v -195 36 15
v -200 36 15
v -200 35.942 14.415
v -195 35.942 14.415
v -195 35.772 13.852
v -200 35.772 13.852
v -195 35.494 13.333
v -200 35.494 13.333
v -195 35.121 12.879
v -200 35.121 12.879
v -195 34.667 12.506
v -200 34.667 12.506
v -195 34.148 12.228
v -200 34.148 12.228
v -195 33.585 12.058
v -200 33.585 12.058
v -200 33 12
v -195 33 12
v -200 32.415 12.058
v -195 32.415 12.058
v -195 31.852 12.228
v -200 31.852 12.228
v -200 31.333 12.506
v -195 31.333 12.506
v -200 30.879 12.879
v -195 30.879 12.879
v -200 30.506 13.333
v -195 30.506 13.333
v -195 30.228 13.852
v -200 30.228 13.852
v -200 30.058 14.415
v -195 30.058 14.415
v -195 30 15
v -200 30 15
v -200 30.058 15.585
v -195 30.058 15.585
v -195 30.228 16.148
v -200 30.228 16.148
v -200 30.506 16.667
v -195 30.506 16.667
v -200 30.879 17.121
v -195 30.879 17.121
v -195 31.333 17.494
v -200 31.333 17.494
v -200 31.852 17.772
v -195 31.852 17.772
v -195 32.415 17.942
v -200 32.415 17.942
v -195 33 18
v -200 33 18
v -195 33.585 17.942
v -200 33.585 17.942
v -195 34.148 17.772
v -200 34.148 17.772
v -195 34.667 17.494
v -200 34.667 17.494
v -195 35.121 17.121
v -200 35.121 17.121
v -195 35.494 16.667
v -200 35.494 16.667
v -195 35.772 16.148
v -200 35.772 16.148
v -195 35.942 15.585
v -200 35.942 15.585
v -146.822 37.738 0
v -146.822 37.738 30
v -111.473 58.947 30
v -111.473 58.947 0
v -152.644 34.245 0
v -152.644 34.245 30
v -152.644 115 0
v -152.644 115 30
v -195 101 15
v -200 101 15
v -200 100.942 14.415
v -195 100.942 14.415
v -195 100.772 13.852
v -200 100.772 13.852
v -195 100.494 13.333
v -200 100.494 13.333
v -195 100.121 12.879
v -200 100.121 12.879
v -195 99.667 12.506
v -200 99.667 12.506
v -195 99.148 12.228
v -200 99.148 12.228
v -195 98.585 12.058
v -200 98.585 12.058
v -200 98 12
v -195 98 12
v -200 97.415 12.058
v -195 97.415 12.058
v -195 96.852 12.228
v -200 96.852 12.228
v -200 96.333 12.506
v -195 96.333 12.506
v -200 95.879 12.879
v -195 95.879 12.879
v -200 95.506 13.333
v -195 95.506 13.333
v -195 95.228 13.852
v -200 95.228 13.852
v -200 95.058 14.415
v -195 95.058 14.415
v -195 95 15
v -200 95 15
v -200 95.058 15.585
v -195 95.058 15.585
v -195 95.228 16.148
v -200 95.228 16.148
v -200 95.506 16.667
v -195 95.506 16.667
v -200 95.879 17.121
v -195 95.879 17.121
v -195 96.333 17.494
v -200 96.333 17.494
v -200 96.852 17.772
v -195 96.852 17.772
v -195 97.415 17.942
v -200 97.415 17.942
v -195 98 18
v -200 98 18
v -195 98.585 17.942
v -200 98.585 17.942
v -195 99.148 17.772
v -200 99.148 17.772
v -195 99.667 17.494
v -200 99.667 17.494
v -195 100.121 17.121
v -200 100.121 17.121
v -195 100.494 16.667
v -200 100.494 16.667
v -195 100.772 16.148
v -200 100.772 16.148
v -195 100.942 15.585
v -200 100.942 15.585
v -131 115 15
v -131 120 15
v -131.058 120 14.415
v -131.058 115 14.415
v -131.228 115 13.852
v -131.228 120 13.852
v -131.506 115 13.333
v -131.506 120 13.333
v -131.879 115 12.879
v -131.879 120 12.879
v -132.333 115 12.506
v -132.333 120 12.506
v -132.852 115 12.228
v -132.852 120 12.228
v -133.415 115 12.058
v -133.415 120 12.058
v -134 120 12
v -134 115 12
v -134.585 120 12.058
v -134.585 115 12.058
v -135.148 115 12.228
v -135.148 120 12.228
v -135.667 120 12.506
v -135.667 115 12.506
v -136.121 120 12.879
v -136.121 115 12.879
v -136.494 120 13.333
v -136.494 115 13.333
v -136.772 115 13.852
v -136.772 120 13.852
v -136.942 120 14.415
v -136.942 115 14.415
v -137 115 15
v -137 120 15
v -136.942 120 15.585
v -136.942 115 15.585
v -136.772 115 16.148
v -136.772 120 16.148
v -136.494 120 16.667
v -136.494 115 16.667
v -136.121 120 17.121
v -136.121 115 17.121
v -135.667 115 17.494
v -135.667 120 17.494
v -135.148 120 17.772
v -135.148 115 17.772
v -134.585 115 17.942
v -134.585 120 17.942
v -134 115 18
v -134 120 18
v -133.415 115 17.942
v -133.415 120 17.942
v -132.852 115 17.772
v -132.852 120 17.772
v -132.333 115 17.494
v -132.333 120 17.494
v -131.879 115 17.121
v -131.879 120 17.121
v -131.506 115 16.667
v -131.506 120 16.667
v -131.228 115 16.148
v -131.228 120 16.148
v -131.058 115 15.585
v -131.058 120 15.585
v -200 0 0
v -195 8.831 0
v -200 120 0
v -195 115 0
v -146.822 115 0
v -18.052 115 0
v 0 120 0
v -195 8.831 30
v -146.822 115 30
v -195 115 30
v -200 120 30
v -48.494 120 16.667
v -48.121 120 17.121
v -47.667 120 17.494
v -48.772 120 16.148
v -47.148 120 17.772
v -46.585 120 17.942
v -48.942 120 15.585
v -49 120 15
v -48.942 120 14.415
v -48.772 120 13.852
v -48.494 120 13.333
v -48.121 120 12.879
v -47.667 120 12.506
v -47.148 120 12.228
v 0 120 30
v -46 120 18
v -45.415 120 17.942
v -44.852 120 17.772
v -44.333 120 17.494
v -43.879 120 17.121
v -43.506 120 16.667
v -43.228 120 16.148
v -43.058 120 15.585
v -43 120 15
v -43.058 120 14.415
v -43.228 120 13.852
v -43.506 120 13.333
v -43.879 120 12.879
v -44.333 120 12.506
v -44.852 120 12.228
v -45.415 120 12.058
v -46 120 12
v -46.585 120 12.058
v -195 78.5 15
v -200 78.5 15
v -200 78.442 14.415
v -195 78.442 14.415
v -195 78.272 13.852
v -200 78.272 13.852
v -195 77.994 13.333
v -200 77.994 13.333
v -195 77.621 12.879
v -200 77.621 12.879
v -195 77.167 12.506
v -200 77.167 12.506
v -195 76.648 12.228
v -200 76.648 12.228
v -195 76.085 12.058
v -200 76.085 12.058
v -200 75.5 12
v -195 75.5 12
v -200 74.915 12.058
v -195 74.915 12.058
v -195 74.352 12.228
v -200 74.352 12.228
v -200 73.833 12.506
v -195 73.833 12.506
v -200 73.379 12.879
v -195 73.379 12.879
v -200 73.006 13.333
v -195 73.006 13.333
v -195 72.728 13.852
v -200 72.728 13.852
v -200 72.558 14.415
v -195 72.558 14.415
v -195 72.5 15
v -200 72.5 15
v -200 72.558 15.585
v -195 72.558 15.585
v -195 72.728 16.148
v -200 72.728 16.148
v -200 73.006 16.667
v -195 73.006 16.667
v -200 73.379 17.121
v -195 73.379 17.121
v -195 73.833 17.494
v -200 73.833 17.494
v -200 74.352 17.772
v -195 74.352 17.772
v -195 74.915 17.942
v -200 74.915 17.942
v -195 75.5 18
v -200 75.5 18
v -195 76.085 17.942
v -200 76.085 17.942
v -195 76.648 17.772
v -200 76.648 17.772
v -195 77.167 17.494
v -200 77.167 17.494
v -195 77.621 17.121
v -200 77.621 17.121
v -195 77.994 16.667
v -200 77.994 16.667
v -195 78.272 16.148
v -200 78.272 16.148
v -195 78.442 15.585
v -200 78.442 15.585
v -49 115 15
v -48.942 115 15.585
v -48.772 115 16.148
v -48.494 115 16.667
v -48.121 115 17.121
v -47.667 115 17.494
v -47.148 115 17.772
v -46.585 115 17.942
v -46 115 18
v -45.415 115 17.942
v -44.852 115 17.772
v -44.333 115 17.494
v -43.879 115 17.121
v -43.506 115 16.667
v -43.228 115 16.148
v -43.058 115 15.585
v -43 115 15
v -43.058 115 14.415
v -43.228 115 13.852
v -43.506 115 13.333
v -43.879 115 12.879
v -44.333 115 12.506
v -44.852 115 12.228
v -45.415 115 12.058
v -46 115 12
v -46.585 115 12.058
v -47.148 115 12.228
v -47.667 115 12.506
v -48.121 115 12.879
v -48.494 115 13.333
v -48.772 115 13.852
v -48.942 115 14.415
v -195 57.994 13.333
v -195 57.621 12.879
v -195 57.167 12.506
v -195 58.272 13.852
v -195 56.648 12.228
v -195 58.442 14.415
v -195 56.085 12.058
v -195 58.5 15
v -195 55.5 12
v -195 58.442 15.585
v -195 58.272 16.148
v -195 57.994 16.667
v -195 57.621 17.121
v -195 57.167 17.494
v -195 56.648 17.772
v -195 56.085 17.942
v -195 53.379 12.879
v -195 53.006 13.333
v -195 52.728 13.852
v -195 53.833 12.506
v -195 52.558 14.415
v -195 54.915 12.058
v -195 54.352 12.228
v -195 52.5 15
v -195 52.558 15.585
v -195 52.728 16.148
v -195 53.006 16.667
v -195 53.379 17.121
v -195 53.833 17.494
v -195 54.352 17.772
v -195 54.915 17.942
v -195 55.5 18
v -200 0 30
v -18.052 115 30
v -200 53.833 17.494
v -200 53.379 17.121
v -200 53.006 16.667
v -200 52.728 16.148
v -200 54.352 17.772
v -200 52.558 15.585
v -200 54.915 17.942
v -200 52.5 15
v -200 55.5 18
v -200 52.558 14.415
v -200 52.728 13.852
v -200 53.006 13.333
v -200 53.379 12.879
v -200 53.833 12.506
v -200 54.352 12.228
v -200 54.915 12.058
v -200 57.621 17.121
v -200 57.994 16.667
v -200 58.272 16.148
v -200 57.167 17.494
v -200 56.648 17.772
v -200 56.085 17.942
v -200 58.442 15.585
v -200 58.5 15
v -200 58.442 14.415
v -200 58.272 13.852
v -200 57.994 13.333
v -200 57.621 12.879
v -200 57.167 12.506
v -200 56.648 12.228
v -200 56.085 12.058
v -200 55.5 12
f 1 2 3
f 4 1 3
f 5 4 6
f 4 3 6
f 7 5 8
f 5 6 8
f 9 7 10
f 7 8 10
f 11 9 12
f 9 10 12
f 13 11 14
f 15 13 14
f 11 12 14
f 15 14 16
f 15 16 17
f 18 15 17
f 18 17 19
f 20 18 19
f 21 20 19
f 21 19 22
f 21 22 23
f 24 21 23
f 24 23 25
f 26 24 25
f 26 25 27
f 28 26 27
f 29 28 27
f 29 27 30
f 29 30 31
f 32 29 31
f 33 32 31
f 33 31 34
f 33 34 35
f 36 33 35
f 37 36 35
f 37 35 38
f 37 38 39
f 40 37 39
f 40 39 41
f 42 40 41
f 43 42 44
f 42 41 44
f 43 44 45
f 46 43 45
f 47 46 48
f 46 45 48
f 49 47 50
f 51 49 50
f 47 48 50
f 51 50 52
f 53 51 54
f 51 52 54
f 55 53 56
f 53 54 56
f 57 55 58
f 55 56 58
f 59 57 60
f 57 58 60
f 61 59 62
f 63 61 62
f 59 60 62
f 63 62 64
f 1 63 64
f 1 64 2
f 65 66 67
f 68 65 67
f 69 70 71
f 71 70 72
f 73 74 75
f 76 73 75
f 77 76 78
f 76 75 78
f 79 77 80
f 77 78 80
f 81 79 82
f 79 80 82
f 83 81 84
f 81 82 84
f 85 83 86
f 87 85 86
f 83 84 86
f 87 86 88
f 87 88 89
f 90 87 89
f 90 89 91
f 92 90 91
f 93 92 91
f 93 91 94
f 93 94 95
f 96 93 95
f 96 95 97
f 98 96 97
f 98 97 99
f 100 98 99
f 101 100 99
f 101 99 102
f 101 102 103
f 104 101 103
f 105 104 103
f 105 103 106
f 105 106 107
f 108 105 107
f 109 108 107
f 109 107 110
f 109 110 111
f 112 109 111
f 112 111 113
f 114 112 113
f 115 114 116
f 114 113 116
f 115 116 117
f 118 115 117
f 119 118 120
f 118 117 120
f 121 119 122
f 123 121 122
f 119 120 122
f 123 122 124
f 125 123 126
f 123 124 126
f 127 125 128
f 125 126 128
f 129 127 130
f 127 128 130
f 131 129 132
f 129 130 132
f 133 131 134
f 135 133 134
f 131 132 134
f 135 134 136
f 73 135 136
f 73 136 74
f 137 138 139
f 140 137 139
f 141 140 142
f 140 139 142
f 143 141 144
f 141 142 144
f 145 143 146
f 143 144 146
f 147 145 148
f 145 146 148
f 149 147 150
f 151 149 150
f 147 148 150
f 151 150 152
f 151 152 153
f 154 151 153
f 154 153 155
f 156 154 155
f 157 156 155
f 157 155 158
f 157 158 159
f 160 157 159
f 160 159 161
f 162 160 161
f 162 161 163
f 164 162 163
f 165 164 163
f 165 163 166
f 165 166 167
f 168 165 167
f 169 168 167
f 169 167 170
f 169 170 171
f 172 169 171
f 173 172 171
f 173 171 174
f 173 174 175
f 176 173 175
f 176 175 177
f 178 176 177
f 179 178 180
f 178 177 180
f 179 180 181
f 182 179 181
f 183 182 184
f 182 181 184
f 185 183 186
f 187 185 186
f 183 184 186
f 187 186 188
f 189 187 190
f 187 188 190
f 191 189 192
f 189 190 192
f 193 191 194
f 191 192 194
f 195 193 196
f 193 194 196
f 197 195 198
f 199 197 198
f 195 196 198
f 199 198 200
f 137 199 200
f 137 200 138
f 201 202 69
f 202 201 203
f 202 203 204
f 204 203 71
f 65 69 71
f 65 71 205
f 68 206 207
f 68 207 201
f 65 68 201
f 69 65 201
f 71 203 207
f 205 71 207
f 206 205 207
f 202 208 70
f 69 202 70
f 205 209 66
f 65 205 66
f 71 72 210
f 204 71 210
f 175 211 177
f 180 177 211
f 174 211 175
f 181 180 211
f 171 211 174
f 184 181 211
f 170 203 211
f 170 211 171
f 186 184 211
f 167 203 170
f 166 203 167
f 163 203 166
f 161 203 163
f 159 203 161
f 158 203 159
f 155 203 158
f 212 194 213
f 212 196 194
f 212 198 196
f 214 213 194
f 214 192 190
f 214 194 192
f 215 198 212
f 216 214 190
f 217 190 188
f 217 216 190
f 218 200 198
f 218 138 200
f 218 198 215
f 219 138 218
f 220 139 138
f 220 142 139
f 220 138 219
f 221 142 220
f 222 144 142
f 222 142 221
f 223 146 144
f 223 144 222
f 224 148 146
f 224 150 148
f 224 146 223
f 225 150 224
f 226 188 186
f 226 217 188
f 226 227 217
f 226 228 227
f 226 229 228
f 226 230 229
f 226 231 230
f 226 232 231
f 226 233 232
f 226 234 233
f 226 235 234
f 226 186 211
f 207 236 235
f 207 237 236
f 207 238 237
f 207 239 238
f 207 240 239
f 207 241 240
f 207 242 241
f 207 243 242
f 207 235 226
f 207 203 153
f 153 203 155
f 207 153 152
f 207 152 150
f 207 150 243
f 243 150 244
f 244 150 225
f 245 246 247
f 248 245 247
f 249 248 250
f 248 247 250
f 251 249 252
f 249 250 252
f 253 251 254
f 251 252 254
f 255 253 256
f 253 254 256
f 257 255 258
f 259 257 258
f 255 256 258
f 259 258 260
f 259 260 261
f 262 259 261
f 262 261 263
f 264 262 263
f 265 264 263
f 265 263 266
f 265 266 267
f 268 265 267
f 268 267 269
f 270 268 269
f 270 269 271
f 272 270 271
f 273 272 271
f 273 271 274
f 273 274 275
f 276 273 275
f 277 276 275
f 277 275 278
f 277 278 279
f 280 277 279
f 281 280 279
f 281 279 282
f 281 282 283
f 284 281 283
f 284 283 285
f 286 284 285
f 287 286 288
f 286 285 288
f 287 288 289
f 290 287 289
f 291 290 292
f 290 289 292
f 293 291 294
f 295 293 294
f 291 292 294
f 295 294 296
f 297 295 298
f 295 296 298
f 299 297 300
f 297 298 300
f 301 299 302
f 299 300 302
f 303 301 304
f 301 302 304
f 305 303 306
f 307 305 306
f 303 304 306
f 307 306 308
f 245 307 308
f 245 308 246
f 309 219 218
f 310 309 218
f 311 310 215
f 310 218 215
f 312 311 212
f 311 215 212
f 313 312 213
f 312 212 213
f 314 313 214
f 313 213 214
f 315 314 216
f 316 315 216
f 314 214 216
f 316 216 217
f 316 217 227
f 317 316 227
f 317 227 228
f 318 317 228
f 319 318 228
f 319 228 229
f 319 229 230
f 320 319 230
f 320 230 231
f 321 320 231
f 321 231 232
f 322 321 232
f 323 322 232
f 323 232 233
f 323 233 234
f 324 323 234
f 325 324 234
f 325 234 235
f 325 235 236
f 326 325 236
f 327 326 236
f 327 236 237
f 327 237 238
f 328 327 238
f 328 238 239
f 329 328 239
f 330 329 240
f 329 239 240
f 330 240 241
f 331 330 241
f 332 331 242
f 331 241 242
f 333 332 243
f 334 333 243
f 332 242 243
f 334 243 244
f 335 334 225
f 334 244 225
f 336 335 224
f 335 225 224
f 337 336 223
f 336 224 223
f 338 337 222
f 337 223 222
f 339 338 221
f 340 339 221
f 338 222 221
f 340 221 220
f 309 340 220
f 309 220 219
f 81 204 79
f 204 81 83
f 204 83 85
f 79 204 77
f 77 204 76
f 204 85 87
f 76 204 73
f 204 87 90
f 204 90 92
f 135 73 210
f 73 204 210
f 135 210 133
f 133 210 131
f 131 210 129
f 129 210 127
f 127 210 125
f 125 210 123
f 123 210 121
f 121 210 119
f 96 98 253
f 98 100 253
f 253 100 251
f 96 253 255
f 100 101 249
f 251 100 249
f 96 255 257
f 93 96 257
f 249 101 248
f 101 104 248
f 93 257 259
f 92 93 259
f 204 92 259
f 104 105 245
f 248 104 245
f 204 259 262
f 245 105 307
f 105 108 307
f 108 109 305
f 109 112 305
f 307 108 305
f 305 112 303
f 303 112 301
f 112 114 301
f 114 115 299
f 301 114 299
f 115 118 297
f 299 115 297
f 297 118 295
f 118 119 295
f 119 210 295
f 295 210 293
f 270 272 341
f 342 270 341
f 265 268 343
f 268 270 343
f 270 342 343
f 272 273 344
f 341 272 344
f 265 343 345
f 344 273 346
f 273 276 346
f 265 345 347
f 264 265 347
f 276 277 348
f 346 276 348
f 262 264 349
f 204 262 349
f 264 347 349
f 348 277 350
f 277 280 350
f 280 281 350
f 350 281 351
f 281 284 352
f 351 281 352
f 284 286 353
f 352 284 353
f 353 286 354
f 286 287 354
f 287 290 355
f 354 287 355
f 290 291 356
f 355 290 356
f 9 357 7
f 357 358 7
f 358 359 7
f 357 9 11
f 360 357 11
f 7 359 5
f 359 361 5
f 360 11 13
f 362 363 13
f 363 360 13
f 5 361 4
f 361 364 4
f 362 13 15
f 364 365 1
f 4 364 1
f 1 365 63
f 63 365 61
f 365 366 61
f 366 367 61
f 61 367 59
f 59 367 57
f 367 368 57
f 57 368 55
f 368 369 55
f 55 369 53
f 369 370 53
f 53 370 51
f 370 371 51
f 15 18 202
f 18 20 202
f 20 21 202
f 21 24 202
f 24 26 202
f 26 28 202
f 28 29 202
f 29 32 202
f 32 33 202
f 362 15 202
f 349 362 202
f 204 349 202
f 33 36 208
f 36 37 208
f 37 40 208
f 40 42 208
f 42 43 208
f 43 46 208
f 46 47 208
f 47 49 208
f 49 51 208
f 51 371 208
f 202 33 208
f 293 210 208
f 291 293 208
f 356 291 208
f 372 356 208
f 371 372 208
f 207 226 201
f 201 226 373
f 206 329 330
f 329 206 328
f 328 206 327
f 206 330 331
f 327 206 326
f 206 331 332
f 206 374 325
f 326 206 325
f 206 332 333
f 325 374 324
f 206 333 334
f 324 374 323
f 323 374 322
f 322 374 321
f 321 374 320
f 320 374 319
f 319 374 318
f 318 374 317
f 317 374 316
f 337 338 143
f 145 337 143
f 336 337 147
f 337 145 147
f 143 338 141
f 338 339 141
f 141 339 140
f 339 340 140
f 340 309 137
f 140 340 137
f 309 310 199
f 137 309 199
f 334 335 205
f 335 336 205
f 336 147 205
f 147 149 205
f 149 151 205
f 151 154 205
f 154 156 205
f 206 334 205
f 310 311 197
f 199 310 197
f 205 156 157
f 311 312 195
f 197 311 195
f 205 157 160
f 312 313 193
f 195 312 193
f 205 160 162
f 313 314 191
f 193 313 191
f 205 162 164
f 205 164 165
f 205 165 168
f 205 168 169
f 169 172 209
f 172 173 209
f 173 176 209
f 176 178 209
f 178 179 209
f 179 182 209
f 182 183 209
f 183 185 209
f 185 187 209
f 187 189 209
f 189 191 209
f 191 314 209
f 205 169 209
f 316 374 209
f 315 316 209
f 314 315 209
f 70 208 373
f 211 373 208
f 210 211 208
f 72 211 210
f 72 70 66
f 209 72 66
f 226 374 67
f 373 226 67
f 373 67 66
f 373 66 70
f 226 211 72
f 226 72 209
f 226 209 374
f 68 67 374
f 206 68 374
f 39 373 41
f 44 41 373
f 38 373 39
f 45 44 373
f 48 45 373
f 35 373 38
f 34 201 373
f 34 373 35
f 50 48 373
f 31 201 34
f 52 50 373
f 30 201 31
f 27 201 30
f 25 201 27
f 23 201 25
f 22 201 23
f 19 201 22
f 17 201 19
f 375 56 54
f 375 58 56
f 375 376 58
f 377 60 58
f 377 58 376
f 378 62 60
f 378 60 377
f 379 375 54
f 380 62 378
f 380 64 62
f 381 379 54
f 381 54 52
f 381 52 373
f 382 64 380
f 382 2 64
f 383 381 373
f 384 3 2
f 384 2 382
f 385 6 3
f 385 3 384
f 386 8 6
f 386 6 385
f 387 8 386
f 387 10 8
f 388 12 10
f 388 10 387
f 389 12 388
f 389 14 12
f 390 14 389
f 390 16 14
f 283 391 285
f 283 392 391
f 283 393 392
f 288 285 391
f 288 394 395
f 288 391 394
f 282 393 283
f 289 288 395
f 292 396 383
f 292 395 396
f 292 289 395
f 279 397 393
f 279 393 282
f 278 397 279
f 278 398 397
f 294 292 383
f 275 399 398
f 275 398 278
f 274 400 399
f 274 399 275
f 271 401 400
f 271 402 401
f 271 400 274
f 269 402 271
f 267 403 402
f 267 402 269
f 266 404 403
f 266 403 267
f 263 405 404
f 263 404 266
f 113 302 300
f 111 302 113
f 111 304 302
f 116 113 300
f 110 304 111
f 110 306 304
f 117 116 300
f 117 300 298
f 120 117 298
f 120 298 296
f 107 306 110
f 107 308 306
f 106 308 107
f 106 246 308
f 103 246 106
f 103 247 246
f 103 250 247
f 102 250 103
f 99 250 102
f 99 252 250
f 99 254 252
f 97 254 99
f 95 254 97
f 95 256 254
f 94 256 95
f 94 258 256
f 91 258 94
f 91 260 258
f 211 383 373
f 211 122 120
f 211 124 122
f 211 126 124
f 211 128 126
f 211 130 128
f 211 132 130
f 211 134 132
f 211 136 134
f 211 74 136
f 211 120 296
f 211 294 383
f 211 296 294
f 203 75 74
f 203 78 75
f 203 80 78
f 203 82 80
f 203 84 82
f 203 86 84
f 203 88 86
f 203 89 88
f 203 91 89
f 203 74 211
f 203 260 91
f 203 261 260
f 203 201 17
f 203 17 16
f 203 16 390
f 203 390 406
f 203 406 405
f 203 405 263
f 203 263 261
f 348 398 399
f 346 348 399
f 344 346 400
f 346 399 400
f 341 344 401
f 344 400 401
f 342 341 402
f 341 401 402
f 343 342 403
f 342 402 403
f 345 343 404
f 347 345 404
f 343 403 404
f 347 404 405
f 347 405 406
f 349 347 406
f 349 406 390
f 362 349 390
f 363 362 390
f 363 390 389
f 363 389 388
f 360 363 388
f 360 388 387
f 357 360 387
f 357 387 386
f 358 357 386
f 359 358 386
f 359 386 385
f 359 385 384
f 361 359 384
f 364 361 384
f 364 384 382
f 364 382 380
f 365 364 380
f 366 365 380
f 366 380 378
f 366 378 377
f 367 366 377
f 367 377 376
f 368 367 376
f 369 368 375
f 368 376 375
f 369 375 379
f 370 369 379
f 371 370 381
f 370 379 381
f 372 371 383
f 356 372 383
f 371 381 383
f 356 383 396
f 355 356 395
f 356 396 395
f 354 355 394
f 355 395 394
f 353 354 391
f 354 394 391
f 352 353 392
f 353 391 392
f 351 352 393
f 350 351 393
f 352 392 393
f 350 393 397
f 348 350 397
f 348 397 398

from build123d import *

# Parameters (mm, degrees)
F0_W     = 200
F0_H     = 120
F1_DEPTH = 30
F3_DEPTH = 30
F5_DEPTH = 30
F7_DEPTH = 6
F9_DEPTH = 6


with BuildPart() as f1:
    # F0 (on Top) → F1 (new body)
    with BuildSketch(Plane.XY):
        with Locations((-100, 60)):
            Rectangle(F0_W, F0_H)
    extrude(amount=F1_DEPTH)

    # F2 (on face) → F3 (cut)
    with BuildSketch(Plane.XY.offset(30)):
        Polygon((0, 120), (-200, 0), (0, 0), align=None)
    extrude(amount=-F3_DEPTH, mode=Mode.SUBTRACT)

    # F4 (on face) → F5 (cut)
    with BuildSketch(Plane.XY.offset(30)):
        Polygon((-195, 60.924411), (-195, 8.830952), (-152.64377, 34.24469), (-152.64377, 115), (-195, 115), align=None)
        Polygon((-146.821752, 115), (-146.821752, 37.737901), (-111.472848, 58.947243), (-18.051586, 115), (-115.799665, 115), align=None)
    extrude(amount=-F5_DEPTH, mode=Mode.SUBTRACT)

    # F6 (on face) → F7 (cut)
    with BuildSketch(Plane(origin=(0, 120, 0), x_dir=(-1, 0, 0), z_dir=(0, 1, 0))):
        with BuildLine():
            ThreePointArc((137, 15), (134, 18), (131, 15))
            ThreePointArc((131, 15), (134, 12), (137, 15))
        make_face()
        with BuildLine():
            Line((46, 15), (43, 15))
            ThreePointArc((43, 15), (46, 12), (49, 15))
            Line((49, 15), (46, 15))
        make_face()
        with BuildLine():
            ThreePointArc((49, 15), (46, 18), (43, 15))
            Line((43, 15), (46, 15))
            Line((46, 15), (49, 15))
        make_face()
    extrude(amount=-F7_DEPTH, mode=Mode.SUBTRACT)

    # F8 (on face) → F9 (cut)
    with BuildSketch(Plane(origin=(-200, 0, 0), x_dir=(0, -1, 0), z_dir=(-1, 0, 0))):
        with BuildLine():
            Line((-33, 15), (-30, 15))
            ThreePointArc((-30, 15), (-33, 18), (-36, 15))
            Line((-36, 15), (-33, 15))
        make_face()
        with BuildLine():
            ThreePointArc((-36, 15), (-33, 12), (-30, 15))
            Line((-30, 15), (-33, 15))
            Line((-33, 15), (-36, 15))
        make_face()
        with BuildLine():
            Line((-55.5, 15), (-52.5, 15))
            ThreePointArc((-52.5, 15), (-55.5, 18), (-58.5, 15))
            Line((-58.5, 15), (-55.5, 15))
        make_face()
        with BuildLine():
            ThreePointArc((-58.5, 15), (-55.5, 12), (-52.5, 15))
            Line((-52.5, 15), (-55.5, 15))
            Line((-55.5, 15), (-58.5, 15))
        make_face()
        with BuildLine():
            Line((-75.5, 15), (-72.5, 15))
            ThreePointArc((-72.5, 15), (-75.5, 18), (-78.5, 15))
            Line((-78.5, 15), (-75.5, 15))
        make_face()
        with BuildLine():
            ThreePointArc((-78.5, 15), (-75.5, 12), (-72.5, 15))
            Line((-72.5, 15), (-75.5, 15))
            Line((-75.5, 15), (-78.5, 15))
        make_face()
        with BuildLine():
            ThreePointArc((-95, 15), (-98, 18), (-101, 15))
            Line((-101, 15), (-98, 15))
            Line((-98, 15), (-95, 15))
        make_face()
        with BuildLine():
            Line((-98, 15), (-101, 15))
            ThreePointArc((-101, 15), (-98, 12), (-95, 15))
            Line((-95, 15), (-98, 15))
        make_face()
    extrude(amount=-F9_DEPTH, mode=Mode.SUBTRACT)


solid = f1.part
